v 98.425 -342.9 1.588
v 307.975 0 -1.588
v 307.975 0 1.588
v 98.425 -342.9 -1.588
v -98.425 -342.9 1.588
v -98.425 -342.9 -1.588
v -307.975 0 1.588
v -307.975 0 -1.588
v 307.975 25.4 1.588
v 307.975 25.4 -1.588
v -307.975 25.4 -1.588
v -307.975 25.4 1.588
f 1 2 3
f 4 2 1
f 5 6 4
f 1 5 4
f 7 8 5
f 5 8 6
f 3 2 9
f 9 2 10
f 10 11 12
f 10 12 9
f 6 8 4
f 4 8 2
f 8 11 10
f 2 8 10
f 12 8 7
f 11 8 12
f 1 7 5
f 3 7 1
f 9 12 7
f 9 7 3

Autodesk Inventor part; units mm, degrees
ref_plane "YZ Plane" through (0, 0, 0) normal (1, 0, 0) x (0, 1, 0)
ref_plane "XZ Plane" through (0, 0, 0) normal (0, 1, 0) x (-1, 0, 0)
ref_plane "XY Plane" through (0, 0, 0) normal (0, 0, 1) x (1, 0, 0)
sketch "Sketch1" plane through (0, 0, 0) normal (0, 0, 1) x (1, 0, 0)
  line L0 (-431.165, 0) -> (431.165, 0) projected
  line L1 (0, -416.56) -> (0, 99.06) projected
  line L2 (-307.975, 25.4) -> (307.975, 25.4)
  line L3 (-98.425, -342.9) -> (98.425, -342.9)
  line L4 (-307.975, 0) -> (-98.425, -342.9)
  line L5 (307.975, 0) -> (98.425, -342.9)
  line L6 (307.975, 0) -> (307.975, 25.4)
  line L7 (-307.975, 0) -> (-307.975, 25.4)
  point P0 (0, 0)
  point P1 (0, 25.4)
  point P2 (0, -342.9)
  point P3 (0, 25.4)
  dimension "d0" = 196.85
  dimension "d2" = 368.3
  dimension "d7" = 25.4
  dimension "d8" = 615.95
extrude "Extrusion1" add sketch "Sketch1" along normal mid plane 3.175
properties part number "electrical board back" material "ABS Plastic"
